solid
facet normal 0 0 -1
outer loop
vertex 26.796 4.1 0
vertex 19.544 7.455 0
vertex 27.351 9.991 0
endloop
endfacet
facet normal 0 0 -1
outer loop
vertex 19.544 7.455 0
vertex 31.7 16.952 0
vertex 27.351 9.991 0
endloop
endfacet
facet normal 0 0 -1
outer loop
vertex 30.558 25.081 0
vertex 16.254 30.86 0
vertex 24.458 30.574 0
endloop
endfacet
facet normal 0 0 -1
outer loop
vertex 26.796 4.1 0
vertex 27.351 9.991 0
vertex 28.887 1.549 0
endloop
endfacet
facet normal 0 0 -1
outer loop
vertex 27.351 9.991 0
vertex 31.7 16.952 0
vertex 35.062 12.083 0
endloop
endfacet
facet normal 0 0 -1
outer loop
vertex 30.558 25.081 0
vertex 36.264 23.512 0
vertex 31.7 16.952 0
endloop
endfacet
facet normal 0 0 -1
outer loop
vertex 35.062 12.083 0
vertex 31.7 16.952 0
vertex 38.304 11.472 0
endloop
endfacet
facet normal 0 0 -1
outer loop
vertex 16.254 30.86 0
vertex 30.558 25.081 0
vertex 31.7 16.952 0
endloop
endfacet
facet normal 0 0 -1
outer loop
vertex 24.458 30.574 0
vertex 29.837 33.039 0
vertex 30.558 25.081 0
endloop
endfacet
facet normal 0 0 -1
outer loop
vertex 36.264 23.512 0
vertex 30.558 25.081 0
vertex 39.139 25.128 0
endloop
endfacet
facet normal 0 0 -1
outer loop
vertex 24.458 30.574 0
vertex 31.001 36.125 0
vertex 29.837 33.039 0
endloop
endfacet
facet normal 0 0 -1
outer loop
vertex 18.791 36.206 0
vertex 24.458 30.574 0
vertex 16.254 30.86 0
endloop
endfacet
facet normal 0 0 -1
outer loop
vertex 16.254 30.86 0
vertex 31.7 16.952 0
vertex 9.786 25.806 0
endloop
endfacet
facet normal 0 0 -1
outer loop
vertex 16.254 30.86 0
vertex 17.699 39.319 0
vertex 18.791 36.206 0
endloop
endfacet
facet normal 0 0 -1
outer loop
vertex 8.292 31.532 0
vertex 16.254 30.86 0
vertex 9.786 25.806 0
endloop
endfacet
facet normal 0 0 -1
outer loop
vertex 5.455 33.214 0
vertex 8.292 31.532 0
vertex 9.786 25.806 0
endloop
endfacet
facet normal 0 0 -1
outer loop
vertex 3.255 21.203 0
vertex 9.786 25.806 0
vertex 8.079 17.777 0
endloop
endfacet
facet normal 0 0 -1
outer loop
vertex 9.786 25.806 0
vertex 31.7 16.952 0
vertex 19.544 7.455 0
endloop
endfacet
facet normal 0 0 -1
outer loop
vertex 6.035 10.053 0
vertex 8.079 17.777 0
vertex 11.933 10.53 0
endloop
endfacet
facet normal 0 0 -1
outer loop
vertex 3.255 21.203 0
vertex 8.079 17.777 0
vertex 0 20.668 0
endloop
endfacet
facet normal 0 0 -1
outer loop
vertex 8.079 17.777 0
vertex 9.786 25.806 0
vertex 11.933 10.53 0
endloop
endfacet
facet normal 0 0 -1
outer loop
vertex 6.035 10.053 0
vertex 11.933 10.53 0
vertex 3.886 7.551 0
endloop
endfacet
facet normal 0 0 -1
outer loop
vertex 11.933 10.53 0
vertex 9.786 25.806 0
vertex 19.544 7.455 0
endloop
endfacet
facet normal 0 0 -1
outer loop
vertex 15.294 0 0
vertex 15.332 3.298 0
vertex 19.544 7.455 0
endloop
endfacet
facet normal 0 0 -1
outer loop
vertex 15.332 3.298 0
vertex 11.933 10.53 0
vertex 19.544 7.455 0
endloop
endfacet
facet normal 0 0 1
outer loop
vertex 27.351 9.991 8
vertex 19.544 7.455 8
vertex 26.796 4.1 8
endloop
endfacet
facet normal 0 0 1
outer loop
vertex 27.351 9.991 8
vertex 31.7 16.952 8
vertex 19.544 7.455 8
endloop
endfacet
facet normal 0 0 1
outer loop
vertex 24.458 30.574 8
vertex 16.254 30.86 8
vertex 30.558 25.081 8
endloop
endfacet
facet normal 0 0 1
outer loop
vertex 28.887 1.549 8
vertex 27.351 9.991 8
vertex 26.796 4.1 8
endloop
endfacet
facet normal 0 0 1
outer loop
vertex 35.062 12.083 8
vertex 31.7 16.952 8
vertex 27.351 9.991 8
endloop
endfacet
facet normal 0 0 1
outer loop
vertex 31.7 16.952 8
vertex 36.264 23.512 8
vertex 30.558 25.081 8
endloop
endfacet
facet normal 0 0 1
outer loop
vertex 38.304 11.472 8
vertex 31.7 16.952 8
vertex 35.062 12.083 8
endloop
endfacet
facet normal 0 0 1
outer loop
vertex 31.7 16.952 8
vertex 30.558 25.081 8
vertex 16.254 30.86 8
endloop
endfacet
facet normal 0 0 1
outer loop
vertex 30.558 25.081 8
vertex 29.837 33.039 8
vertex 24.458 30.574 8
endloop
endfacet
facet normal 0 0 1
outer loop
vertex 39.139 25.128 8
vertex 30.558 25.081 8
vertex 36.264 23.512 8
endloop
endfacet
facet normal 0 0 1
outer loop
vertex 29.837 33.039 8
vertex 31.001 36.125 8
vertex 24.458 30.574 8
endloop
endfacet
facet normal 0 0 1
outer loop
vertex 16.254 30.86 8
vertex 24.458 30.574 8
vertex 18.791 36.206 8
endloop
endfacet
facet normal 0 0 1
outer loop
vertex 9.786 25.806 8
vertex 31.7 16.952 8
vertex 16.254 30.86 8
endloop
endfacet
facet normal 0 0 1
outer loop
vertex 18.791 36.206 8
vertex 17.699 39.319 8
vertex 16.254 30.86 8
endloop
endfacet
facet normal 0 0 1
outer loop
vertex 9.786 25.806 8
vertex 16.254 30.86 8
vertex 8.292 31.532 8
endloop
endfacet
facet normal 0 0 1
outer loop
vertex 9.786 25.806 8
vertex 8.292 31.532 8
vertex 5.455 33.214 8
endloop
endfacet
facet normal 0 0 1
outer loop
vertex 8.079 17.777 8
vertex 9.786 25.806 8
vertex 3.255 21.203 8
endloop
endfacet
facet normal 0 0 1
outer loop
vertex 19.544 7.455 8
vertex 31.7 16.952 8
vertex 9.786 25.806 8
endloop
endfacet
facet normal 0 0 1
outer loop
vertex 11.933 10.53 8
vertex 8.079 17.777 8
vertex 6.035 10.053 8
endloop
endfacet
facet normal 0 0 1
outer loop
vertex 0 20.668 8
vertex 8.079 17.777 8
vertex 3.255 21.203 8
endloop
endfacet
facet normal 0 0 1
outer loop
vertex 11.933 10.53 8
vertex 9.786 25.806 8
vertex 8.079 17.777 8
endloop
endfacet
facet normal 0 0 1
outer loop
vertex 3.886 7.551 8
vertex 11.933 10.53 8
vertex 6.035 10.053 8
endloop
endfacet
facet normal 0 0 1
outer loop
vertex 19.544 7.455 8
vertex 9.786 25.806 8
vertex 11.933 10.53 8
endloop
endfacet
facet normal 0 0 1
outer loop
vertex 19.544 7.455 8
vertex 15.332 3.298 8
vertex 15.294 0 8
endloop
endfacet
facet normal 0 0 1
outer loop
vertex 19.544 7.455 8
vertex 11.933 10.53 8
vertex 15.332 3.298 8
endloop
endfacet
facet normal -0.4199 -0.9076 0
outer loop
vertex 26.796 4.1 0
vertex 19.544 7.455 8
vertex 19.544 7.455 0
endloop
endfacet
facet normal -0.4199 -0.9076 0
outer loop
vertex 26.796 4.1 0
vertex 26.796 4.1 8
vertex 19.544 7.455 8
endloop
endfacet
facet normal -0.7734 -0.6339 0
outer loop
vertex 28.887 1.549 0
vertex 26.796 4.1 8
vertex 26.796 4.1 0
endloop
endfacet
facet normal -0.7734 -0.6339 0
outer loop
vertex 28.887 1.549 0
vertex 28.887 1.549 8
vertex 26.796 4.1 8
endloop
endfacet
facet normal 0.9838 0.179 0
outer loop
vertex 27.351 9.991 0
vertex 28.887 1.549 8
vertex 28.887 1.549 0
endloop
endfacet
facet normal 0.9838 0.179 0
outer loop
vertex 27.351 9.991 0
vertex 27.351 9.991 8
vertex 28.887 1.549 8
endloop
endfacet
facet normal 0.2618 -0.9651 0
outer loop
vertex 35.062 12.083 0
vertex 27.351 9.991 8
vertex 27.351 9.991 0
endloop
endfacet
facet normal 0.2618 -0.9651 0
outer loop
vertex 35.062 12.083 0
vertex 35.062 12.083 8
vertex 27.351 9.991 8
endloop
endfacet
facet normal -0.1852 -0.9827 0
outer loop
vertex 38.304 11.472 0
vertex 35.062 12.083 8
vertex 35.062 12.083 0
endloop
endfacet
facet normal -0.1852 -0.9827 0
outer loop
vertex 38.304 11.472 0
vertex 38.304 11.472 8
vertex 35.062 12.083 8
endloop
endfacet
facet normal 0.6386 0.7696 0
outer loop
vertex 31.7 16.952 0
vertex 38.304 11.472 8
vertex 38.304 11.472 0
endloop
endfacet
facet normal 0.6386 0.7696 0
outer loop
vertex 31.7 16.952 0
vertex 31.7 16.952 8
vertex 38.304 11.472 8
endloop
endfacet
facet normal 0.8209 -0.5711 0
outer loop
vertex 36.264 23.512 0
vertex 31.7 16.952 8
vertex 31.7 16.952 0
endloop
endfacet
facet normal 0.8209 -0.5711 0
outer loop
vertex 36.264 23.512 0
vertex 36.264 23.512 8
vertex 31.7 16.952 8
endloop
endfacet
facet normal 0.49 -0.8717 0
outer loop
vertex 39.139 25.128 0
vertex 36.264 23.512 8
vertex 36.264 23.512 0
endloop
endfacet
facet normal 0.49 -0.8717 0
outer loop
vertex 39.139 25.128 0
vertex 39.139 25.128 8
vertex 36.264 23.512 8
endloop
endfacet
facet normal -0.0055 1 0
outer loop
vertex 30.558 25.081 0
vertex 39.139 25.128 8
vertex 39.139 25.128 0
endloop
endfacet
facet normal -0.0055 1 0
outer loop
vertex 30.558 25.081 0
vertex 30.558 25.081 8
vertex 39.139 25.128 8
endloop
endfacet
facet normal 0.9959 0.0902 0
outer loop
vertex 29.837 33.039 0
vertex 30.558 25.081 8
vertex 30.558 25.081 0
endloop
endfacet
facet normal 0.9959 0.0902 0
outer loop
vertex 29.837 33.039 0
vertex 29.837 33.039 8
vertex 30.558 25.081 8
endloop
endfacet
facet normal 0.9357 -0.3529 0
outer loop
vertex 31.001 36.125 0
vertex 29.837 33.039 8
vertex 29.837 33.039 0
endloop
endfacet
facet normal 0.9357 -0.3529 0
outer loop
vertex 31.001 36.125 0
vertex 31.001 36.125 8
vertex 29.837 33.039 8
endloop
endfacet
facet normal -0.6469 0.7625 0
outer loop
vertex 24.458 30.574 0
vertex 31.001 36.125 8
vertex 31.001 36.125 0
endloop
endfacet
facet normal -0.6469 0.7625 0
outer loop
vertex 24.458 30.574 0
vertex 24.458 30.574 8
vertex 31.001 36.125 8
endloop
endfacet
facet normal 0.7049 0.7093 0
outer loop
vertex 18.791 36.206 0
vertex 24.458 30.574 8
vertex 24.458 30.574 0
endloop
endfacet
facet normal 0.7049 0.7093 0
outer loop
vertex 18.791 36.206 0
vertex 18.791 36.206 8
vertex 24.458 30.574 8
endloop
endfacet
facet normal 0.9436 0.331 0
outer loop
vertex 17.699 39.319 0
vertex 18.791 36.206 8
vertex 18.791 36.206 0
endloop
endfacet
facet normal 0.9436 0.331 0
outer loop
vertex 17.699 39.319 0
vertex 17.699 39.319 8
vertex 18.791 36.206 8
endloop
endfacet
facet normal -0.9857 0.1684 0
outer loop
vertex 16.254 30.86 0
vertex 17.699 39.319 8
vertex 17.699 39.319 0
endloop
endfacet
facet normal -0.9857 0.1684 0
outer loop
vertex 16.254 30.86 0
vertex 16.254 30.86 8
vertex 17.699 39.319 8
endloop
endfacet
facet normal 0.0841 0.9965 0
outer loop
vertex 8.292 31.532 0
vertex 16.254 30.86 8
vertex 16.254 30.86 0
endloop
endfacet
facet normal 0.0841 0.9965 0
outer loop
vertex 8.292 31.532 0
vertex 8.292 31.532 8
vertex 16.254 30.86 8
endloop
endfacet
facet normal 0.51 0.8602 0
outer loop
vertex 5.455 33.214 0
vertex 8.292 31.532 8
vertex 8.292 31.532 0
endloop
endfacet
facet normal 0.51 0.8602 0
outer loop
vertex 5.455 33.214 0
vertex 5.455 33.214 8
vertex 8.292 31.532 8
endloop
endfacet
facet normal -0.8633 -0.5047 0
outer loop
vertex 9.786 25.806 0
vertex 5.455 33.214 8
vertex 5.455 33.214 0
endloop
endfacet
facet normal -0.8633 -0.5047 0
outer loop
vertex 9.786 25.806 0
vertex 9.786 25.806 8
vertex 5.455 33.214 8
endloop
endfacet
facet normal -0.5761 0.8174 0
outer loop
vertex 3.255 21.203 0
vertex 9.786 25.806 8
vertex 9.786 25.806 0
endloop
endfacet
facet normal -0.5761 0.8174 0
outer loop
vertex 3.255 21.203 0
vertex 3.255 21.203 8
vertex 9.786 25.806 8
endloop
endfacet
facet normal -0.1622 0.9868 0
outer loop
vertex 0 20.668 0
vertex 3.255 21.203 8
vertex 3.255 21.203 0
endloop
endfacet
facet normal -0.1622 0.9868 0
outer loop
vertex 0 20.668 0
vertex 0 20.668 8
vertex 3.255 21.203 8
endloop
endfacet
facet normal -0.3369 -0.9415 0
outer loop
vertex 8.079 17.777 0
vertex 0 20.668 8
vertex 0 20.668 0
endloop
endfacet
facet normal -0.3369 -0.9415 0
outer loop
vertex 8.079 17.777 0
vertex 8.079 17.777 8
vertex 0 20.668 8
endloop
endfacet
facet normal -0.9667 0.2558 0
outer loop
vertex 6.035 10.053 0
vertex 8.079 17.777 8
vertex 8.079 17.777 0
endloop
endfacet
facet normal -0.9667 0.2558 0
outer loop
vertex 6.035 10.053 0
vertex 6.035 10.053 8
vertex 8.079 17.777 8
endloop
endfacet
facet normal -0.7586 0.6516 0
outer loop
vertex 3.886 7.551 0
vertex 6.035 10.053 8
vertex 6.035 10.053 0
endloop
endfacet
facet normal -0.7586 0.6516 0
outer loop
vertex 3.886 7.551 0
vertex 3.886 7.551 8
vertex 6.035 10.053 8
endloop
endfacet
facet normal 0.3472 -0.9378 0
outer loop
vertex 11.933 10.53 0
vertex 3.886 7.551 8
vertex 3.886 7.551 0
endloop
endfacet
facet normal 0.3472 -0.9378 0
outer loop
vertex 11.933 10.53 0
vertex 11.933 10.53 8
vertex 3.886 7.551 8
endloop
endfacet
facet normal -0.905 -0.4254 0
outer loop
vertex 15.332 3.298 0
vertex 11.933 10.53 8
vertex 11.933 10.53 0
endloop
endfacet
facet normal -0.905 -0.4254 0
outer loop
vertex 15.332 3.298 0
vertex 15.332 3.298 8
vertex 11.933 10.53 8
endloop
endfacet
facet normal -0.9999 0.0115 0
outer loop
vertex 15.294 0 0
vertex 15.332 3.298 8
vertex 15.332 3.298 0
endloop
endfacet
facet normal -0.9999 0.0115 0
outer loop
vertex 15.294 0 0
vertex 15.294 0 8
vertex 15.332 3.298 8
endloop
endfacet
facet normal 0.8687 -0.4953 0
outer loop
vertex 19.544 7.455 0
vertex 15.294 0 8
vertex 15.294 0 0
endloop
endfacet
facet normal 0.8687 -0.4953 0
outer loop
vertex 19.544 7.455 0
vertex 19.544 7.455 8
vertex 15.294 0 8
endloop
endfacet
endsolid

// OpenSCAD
$fn = 32;

// ----------------------------------------------------------------------
// Fan rotor section: 9 blades, 12 mm hub radius, 8 mm blades
// ----------------------------------------------------------------------

// --- parameters (mm) ---
profile_height = 8;       // extrusion height
profile_points = 27;      // points of the closed outline

profile = [[31.7, 16.952], [36.264, 23.512], [39.139, 25.128], [30.558, 25.081], [29.837, 33.039], [31.001, 36.125], [24.458, 30.574], [18.791, 36.206], [17.699, 39.319], [16.254, 30.86], [8.292, 31.532], [5.455, 33.214], [9.786, 25.806], [3.255, 21.203], [0, 20.668], [8.079, 17.777], [6.035, 10.053], [3.886, 7.551], [11.933, 10.53], [15.332, 3.298], [15.294, 0], [19.544, 7.455], [26.796, 4.1], [28.887, 1.549], [27.351, 9.991], [35.062, 12.083], [38.304, 11.472]];  // single closed polygon, 27 points, counter clockwise

// --- the one profile operation ---
linear_extrude(height = profile_height) polygon(points = profile);
